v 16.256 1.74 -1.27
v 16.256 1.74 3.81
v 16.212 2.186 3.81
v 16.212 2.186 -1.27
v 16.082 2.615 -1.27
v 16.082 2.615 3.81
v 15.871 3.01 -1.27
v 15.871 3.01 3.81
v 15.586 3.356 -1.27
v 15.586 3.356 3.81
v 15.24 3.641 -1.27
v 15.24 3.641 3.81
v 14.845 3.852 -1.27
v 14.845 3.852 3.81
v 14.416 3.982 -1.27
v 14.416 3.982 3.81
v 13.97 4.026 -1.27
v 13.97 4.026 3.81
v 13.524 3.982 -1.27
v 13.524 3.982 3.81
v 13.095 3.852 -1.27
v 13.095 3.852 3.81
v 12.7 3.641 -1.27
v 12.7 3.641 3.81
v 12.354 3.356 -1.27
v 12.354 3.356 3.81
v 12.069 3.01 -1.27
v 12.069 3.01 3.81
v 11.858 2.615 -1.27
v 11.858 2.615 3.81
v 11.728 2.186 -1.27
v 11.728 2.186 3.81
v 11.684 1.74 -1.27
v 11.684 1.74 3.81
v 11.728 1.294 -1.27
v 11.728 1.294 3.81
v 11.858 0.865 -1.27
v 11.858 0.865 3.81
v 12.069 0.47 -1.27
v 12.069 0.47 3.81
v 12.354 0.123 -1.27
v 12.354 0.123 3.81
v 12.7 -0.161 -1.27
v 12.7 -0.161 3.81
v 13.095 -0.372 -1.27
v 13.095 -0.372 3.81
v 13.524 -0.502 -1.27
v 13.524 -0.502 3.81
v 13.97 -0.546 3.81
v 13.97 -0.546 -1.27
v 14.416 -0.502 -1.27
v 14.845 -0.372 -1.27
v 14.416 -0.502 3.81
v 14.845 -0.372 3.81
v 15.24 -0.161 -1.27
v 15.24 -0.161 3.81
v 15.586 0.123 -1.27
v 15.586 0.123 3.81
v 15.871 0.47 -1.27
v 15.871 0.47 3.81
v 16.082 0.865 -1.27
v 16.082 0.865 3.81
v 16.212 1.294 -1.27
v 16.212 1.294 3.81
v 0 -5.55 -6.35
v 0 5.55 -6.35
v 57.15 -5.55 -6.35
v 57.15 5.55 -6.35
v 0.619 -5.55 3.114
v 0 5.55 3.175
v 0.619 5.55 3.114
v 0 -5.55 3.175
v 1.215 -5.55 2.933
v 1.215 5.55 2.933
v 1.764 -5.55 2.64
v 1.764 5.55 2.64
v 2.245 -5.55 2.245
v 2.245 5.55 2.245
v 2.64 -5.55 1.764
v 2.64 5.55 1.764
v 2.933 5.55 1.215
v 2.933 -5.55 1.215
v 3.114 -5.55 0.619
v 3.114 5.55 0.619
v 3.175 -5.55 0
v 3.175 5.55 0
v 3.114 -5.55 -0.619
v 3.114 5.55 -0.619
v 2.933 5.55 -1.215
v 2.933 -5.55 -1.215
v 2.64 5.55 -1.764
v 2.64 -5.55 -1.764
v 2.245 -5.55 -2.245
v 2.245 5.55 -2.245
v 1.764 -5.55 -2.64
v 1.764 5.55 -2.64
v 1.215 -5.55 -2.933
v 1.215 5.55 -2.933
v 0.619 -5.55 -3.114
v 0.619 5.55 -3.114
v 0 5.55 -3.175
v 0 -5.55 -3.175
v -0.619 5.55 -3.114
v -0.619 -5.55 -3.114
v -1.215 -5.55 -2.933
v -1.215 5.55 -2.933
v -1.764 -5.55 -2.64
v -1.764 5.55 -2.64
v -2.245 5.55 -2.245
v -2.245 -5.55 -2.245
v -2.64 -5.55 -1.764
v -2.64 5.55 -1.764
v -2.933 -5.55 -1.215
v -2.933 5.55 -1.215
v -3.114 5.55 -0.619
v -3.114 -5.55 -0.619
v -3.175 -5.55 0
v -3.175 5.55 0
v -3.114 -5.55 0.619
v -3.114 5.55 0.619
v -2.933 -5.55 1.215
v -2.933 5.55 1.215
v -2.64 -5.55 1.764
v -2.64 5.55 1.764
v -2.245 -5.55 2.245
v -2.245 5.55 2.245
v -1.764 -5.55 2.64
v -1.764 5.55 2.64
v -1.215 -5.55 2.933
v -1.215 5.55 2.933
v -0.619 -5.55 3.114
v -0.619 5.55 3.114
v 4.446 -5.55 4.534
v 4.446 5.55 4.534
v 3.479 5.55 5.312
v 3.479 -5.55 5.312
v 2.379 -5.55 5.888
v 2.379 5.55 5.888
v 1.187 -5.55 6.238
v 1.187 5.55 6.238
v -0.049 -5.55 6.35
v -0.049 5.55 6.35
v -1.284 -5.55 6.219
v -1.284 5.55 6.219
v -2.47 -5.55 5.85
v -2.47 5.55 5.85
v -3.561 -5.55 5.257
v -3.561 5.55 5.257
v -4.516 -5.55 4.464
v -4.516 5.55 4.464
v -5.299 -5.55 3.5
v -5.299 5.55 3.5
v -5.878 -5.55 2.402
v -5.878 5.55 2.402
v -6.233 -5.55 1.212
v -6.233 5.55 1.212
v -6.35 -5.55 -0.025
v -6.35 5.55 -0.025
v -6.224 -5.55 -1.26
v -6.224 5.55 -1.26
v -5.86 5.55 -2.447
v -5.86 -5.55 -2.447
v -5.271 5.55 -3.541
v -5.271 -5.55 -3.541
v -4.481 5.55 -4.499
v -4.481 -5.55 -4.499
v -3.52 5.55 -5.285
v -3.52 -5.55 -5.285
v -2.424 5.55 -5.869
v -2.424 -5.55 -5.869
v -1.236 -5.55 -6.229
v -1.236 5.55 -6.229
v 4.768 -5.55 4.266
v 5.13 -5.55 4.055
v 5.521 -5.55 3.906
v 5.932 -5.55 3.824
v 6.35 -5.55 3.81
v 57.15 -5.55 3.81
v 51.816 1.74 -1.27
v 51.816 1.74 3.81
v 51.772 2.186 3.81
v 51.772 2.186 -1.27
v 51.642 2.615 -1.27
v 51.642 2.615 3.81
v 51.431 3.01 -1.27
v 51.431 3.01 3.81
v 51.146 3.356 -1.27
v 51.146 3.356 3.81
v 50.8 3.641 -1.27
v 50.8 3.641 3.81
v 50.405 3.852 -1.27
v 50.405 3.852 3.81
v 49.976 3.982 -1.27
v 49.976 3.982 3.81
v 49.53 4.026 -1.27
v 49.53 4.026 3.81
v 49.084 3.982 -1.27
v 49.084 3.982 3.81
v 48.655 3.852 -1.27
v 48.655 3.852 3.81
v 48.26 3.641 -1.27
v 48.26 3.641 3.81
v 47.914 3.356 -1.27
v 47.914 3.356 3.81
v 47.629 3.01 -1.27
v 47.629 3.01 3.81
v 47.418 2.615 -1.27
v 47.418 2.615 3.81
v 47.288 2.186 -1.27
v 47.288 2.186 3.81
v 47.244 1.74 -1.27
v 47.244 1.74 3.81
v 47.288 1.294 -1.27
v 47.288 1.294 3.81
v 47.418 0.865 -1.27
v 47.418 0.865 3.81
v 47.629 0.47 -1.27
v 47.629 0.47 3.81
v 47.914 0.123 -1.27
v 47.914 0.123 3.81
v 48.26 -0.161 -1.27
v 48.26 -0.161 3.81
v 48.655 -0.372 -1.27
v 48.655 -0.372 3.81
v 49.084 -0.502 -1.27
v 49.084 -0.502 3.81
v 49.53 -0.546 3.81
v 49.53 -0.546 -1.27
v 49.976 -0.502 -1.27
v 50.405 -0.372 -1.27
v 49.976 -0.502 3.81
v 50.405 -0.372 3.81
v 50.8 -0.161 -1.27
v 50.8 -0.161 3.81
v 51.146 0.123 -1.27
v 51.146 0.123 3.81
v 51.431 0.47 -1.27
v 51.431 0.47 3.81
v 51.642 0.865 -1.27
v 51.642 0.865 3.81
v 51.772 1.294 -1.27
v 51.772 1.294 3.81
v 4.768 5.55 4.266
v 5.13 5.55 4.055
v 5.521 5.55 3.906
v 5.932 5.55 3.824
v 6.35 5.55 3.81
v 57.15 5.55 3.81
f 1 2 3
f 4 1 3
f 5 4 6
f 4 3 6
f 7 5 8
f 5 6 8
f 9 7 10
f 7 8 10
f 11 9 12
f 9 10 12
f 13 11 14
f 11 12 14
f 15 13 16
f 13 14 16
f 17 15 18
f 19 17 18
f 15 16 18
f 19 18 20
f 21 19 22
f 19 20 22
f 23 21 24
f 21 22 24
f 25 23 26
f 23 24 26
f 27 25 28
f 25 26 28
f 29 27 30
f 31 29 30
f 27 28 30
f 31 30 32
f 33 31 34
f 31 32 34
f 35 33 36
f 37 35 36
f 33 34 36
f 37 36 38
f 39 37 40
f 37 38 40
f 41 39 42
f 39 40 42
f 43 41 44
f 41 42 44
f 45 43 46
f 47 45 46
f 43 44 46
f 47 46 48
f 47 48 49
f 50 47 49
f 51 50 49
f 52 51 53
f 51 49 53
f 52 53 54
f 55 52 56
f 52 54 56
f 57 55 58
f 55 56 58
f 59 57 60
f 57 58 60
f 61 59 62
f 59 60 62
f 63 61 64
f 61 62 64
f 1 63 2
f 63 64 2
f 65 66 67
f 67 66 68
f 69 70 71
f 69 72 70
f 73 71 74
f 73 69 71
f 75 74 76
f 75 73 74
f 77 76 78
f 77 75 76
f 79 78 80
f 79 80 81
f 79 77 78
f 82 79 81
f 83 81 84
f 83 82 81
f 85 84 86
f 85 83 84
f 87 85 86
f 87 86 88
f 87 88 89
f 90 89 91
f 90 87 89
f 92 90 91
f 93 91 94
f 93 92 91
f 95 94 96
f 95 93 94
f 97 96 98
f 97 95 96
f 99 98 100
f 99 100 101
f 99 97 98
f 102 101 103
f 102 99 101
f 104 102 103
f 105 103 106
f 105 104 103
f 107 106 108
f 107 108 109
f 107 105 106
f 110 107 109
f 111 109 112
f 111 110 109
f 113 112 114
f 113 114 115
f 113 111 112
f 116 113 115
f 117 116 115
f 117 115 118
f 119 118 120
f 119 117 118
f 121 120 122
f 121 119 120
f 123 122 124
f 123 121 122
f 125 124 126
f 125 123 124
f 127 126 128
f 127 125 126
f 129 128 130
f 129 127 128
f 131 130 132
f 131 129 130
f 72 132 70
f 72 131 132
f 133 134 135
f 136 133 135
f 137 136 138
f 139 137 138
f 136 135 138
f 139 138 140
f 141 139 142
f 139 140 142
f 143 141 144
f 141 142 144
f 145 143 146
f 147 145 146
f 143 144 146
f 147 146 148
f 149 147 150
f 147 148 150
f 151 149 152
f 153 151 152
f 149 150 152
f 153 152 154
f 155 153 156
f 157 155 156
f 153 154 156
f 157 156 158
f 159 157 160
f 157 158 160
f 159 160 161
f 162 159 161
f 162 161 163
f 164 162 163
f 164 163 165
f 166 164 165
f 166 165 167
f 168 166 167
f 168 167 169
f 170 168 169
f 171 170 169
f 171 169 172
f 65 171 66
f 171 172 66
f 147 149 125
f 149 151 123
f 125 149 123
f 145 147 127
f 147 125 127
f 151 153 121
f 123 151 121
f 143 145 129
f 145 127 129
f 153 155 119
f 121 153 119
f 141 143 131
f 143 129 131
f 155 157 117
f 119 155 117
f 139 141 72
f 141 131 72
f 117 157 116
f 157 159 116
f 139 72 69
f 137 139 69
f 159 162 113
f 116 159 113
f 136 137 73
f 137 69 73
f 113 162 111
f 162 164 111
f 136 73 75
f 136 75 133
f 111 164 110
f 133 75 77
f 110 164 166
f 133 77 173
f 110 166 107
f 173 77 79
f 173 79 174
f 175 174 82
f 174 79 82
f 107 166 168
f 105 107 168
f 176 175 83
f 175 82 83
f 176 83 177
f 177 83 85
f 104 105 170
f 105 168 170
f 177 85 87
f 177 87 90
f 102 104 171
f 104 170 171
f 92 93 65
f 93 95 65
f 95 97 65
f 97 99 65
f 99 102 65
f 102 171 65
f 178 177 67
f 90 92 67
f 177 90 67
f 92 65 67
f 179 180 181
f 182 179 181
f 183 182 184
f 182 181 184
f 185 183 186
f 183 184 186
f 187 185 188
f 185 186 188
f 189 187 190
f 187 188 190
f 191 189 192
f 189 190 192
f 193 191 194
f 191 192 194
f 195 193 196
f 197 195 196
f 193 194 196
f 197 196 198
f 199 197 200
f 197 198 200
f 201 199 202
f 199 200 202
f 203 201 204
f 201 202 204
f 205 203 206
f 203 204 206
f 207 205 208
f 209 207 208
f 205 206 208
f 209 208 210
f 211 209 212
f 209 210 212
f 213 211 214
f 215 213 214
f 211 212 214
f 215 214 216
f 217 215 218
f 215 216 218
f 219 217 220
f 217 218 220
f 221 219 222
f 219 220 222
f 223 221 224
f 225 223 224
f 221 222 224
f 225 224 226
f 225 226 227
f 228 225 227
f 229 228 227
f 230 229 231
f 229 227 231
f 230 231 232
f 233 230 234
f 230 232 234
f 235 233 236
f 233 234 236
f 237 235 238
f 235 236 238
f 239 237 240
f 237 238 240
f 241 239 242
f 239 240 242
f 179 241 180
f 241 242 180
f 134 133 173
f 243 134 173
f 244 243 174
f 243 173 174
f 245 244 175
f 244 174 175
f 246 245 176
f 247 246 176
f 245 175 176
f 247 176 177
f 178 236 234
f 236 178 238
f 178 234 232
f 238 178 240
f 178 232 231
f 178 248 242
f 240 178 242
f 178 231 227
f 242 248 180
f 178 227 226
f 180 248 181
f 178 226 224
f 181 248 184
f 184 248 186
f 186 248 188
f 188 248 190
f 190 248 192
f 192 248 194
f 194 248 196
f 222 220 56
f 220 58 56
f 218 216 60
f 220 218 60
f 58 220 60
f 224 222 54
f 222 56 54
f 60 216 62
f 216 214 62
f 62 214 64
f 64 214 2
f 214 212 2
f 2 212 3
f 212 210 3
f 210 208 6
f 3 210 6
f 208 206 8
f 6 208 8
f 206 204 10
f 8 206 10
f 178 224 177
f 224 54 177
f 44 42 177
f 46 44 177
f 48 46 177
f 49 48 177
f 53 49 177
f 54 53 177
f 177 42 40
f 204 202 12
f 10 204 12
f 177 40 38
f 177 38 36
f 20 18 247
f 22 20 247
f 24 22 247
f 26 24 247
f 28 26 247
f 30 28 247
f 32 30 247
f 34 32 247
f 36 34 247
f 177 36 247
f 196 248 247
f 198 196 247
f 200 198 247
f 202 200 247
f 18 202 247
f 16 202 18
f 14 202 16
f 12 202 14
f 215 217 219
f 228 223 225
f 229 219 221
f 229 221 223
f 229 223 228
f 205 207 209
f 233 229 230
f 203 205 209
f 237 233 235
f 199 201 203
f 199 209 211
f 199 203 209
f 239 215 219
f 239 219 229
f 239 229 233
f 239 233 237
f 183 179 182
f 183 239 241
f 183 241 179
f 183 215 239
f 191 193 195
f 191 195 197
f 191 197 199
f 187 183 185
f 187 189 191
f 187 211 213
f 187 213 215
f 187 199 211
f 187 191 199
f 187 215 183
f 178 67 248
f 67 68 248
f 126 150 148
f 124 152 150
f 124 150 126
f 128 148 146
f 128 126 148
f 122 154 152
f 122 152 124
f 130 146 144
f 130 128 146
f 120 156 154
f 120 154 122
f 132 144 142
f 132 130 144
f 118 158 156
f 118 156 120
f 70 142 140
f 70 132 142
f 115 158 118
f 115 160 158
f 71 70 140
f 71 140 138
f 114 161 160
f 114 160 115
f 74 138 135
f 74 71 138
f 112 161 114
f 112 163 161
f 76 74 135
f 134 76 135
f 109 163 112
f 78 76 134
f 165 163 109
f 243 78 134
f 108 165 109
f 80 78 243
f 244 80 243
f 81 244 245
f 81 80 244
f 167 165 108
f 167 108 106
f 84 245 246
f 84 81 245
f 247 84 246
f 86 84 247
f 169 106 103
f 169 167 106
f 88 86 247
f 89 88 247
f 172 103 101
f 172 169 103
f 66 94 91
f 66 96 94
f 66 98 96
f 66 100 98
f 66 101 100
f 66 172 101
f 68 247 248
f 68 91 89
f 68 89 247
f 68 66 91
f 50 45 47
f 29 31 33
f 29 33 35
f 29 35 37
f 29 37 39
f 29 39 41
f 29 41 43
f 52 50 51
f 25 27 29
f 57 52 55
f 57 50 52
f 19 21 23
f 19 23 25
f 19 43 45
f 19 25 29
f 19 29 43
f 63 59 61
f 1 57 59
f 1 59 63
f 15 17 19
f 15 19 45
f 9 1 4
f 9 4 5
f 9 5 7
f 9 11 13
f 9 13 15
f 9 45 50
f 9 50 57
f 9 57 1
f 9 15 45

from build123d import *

# Parameters (mm, degrees)
SKETCH1_R           = 3.175
BOSS_EXTRUDE1_DEPTH = 5.5499
FILLET1_START       = -5.5499
FILLET1_DEPTH       = 11.0998
SKETCH2_R           = 2.286
SKETCH2_R_2         = 1.89865
CUT_EXTRUDE1_DEPTH  = 5.08


with BuildPart() as part:
    # Sketch1 → Boss-Extrude1 (new, symmetric)
    with BuildSketch(Plane(origin=(0, 0, 0), x_dir=(1, 0, 0), z_dir=(0, 1, 0))):
        with BuildLine():
            Line((0, 6.35), (12.366459894, 6.35))
            Line((12.366459894, 6.35), (57.15, 6.35))
            Line((57.15, 6.35), (57.15, -3.81))
            Line((57.15, -3.81), (6.35, -3.81))
            Line((6.35, -3.81), (6.35, 0))
            ThreePointArc((6.35, 0), (-4.490128061, -4.490128061), (0, 6.35))
        make_face()
        with Locations(Location((0, 0, 0), (0, 0, 270))):
            Circle(SKETCH1_R, mode=Mode.SUBTRACT)
    extrude(amount=BOSS_EXTRUDE1_DEPTH, both=True)

    # Fillet1: read off the stored shape, not the designer's step
    # Fillet1 outline → Fillet1 (add)
    with BuildSketch(Plane(origin=(0, 0, 0), x_dir=(1, 0, 0), z_dir=(0, 1, 0)).offset(FILLET1_START)):
        with BuildLine():
            ThreePointArc((4.446322142, -4.533510716), (5.322474594, -3.972611562), (6.35, -3.81))
            Line((6.35, -3.81), (6.35, 0))
            ThreePointArc((6.35, 0), (5.854769236, -2.458490838), (4.446322142, -4.533510716))
        make_face()
    extrude(amount=FILLET1_DEPTH)

    # Sketch2 → Cut-Extrude1 (cut)
    with BuildSketch(Plane.XY.offset(3.81)):
        with Locations((13.97, 1.7399)):
            Circle(SKETCH2_R)
        with Locations((49.53, 1.7399)):
            Circle(SKETCH2_R)
        with Locations((13.97, 1.7399)):
            Circle(SKETCH2_R_2)
        with Locations((49.53, 1.7399)):
            Circle(SKETCH2_R_2)
    extrude(amount=-CUT_EXTRUDE1_DEPTH, mode=Mode.SUBTRACT)


solid = part.part
